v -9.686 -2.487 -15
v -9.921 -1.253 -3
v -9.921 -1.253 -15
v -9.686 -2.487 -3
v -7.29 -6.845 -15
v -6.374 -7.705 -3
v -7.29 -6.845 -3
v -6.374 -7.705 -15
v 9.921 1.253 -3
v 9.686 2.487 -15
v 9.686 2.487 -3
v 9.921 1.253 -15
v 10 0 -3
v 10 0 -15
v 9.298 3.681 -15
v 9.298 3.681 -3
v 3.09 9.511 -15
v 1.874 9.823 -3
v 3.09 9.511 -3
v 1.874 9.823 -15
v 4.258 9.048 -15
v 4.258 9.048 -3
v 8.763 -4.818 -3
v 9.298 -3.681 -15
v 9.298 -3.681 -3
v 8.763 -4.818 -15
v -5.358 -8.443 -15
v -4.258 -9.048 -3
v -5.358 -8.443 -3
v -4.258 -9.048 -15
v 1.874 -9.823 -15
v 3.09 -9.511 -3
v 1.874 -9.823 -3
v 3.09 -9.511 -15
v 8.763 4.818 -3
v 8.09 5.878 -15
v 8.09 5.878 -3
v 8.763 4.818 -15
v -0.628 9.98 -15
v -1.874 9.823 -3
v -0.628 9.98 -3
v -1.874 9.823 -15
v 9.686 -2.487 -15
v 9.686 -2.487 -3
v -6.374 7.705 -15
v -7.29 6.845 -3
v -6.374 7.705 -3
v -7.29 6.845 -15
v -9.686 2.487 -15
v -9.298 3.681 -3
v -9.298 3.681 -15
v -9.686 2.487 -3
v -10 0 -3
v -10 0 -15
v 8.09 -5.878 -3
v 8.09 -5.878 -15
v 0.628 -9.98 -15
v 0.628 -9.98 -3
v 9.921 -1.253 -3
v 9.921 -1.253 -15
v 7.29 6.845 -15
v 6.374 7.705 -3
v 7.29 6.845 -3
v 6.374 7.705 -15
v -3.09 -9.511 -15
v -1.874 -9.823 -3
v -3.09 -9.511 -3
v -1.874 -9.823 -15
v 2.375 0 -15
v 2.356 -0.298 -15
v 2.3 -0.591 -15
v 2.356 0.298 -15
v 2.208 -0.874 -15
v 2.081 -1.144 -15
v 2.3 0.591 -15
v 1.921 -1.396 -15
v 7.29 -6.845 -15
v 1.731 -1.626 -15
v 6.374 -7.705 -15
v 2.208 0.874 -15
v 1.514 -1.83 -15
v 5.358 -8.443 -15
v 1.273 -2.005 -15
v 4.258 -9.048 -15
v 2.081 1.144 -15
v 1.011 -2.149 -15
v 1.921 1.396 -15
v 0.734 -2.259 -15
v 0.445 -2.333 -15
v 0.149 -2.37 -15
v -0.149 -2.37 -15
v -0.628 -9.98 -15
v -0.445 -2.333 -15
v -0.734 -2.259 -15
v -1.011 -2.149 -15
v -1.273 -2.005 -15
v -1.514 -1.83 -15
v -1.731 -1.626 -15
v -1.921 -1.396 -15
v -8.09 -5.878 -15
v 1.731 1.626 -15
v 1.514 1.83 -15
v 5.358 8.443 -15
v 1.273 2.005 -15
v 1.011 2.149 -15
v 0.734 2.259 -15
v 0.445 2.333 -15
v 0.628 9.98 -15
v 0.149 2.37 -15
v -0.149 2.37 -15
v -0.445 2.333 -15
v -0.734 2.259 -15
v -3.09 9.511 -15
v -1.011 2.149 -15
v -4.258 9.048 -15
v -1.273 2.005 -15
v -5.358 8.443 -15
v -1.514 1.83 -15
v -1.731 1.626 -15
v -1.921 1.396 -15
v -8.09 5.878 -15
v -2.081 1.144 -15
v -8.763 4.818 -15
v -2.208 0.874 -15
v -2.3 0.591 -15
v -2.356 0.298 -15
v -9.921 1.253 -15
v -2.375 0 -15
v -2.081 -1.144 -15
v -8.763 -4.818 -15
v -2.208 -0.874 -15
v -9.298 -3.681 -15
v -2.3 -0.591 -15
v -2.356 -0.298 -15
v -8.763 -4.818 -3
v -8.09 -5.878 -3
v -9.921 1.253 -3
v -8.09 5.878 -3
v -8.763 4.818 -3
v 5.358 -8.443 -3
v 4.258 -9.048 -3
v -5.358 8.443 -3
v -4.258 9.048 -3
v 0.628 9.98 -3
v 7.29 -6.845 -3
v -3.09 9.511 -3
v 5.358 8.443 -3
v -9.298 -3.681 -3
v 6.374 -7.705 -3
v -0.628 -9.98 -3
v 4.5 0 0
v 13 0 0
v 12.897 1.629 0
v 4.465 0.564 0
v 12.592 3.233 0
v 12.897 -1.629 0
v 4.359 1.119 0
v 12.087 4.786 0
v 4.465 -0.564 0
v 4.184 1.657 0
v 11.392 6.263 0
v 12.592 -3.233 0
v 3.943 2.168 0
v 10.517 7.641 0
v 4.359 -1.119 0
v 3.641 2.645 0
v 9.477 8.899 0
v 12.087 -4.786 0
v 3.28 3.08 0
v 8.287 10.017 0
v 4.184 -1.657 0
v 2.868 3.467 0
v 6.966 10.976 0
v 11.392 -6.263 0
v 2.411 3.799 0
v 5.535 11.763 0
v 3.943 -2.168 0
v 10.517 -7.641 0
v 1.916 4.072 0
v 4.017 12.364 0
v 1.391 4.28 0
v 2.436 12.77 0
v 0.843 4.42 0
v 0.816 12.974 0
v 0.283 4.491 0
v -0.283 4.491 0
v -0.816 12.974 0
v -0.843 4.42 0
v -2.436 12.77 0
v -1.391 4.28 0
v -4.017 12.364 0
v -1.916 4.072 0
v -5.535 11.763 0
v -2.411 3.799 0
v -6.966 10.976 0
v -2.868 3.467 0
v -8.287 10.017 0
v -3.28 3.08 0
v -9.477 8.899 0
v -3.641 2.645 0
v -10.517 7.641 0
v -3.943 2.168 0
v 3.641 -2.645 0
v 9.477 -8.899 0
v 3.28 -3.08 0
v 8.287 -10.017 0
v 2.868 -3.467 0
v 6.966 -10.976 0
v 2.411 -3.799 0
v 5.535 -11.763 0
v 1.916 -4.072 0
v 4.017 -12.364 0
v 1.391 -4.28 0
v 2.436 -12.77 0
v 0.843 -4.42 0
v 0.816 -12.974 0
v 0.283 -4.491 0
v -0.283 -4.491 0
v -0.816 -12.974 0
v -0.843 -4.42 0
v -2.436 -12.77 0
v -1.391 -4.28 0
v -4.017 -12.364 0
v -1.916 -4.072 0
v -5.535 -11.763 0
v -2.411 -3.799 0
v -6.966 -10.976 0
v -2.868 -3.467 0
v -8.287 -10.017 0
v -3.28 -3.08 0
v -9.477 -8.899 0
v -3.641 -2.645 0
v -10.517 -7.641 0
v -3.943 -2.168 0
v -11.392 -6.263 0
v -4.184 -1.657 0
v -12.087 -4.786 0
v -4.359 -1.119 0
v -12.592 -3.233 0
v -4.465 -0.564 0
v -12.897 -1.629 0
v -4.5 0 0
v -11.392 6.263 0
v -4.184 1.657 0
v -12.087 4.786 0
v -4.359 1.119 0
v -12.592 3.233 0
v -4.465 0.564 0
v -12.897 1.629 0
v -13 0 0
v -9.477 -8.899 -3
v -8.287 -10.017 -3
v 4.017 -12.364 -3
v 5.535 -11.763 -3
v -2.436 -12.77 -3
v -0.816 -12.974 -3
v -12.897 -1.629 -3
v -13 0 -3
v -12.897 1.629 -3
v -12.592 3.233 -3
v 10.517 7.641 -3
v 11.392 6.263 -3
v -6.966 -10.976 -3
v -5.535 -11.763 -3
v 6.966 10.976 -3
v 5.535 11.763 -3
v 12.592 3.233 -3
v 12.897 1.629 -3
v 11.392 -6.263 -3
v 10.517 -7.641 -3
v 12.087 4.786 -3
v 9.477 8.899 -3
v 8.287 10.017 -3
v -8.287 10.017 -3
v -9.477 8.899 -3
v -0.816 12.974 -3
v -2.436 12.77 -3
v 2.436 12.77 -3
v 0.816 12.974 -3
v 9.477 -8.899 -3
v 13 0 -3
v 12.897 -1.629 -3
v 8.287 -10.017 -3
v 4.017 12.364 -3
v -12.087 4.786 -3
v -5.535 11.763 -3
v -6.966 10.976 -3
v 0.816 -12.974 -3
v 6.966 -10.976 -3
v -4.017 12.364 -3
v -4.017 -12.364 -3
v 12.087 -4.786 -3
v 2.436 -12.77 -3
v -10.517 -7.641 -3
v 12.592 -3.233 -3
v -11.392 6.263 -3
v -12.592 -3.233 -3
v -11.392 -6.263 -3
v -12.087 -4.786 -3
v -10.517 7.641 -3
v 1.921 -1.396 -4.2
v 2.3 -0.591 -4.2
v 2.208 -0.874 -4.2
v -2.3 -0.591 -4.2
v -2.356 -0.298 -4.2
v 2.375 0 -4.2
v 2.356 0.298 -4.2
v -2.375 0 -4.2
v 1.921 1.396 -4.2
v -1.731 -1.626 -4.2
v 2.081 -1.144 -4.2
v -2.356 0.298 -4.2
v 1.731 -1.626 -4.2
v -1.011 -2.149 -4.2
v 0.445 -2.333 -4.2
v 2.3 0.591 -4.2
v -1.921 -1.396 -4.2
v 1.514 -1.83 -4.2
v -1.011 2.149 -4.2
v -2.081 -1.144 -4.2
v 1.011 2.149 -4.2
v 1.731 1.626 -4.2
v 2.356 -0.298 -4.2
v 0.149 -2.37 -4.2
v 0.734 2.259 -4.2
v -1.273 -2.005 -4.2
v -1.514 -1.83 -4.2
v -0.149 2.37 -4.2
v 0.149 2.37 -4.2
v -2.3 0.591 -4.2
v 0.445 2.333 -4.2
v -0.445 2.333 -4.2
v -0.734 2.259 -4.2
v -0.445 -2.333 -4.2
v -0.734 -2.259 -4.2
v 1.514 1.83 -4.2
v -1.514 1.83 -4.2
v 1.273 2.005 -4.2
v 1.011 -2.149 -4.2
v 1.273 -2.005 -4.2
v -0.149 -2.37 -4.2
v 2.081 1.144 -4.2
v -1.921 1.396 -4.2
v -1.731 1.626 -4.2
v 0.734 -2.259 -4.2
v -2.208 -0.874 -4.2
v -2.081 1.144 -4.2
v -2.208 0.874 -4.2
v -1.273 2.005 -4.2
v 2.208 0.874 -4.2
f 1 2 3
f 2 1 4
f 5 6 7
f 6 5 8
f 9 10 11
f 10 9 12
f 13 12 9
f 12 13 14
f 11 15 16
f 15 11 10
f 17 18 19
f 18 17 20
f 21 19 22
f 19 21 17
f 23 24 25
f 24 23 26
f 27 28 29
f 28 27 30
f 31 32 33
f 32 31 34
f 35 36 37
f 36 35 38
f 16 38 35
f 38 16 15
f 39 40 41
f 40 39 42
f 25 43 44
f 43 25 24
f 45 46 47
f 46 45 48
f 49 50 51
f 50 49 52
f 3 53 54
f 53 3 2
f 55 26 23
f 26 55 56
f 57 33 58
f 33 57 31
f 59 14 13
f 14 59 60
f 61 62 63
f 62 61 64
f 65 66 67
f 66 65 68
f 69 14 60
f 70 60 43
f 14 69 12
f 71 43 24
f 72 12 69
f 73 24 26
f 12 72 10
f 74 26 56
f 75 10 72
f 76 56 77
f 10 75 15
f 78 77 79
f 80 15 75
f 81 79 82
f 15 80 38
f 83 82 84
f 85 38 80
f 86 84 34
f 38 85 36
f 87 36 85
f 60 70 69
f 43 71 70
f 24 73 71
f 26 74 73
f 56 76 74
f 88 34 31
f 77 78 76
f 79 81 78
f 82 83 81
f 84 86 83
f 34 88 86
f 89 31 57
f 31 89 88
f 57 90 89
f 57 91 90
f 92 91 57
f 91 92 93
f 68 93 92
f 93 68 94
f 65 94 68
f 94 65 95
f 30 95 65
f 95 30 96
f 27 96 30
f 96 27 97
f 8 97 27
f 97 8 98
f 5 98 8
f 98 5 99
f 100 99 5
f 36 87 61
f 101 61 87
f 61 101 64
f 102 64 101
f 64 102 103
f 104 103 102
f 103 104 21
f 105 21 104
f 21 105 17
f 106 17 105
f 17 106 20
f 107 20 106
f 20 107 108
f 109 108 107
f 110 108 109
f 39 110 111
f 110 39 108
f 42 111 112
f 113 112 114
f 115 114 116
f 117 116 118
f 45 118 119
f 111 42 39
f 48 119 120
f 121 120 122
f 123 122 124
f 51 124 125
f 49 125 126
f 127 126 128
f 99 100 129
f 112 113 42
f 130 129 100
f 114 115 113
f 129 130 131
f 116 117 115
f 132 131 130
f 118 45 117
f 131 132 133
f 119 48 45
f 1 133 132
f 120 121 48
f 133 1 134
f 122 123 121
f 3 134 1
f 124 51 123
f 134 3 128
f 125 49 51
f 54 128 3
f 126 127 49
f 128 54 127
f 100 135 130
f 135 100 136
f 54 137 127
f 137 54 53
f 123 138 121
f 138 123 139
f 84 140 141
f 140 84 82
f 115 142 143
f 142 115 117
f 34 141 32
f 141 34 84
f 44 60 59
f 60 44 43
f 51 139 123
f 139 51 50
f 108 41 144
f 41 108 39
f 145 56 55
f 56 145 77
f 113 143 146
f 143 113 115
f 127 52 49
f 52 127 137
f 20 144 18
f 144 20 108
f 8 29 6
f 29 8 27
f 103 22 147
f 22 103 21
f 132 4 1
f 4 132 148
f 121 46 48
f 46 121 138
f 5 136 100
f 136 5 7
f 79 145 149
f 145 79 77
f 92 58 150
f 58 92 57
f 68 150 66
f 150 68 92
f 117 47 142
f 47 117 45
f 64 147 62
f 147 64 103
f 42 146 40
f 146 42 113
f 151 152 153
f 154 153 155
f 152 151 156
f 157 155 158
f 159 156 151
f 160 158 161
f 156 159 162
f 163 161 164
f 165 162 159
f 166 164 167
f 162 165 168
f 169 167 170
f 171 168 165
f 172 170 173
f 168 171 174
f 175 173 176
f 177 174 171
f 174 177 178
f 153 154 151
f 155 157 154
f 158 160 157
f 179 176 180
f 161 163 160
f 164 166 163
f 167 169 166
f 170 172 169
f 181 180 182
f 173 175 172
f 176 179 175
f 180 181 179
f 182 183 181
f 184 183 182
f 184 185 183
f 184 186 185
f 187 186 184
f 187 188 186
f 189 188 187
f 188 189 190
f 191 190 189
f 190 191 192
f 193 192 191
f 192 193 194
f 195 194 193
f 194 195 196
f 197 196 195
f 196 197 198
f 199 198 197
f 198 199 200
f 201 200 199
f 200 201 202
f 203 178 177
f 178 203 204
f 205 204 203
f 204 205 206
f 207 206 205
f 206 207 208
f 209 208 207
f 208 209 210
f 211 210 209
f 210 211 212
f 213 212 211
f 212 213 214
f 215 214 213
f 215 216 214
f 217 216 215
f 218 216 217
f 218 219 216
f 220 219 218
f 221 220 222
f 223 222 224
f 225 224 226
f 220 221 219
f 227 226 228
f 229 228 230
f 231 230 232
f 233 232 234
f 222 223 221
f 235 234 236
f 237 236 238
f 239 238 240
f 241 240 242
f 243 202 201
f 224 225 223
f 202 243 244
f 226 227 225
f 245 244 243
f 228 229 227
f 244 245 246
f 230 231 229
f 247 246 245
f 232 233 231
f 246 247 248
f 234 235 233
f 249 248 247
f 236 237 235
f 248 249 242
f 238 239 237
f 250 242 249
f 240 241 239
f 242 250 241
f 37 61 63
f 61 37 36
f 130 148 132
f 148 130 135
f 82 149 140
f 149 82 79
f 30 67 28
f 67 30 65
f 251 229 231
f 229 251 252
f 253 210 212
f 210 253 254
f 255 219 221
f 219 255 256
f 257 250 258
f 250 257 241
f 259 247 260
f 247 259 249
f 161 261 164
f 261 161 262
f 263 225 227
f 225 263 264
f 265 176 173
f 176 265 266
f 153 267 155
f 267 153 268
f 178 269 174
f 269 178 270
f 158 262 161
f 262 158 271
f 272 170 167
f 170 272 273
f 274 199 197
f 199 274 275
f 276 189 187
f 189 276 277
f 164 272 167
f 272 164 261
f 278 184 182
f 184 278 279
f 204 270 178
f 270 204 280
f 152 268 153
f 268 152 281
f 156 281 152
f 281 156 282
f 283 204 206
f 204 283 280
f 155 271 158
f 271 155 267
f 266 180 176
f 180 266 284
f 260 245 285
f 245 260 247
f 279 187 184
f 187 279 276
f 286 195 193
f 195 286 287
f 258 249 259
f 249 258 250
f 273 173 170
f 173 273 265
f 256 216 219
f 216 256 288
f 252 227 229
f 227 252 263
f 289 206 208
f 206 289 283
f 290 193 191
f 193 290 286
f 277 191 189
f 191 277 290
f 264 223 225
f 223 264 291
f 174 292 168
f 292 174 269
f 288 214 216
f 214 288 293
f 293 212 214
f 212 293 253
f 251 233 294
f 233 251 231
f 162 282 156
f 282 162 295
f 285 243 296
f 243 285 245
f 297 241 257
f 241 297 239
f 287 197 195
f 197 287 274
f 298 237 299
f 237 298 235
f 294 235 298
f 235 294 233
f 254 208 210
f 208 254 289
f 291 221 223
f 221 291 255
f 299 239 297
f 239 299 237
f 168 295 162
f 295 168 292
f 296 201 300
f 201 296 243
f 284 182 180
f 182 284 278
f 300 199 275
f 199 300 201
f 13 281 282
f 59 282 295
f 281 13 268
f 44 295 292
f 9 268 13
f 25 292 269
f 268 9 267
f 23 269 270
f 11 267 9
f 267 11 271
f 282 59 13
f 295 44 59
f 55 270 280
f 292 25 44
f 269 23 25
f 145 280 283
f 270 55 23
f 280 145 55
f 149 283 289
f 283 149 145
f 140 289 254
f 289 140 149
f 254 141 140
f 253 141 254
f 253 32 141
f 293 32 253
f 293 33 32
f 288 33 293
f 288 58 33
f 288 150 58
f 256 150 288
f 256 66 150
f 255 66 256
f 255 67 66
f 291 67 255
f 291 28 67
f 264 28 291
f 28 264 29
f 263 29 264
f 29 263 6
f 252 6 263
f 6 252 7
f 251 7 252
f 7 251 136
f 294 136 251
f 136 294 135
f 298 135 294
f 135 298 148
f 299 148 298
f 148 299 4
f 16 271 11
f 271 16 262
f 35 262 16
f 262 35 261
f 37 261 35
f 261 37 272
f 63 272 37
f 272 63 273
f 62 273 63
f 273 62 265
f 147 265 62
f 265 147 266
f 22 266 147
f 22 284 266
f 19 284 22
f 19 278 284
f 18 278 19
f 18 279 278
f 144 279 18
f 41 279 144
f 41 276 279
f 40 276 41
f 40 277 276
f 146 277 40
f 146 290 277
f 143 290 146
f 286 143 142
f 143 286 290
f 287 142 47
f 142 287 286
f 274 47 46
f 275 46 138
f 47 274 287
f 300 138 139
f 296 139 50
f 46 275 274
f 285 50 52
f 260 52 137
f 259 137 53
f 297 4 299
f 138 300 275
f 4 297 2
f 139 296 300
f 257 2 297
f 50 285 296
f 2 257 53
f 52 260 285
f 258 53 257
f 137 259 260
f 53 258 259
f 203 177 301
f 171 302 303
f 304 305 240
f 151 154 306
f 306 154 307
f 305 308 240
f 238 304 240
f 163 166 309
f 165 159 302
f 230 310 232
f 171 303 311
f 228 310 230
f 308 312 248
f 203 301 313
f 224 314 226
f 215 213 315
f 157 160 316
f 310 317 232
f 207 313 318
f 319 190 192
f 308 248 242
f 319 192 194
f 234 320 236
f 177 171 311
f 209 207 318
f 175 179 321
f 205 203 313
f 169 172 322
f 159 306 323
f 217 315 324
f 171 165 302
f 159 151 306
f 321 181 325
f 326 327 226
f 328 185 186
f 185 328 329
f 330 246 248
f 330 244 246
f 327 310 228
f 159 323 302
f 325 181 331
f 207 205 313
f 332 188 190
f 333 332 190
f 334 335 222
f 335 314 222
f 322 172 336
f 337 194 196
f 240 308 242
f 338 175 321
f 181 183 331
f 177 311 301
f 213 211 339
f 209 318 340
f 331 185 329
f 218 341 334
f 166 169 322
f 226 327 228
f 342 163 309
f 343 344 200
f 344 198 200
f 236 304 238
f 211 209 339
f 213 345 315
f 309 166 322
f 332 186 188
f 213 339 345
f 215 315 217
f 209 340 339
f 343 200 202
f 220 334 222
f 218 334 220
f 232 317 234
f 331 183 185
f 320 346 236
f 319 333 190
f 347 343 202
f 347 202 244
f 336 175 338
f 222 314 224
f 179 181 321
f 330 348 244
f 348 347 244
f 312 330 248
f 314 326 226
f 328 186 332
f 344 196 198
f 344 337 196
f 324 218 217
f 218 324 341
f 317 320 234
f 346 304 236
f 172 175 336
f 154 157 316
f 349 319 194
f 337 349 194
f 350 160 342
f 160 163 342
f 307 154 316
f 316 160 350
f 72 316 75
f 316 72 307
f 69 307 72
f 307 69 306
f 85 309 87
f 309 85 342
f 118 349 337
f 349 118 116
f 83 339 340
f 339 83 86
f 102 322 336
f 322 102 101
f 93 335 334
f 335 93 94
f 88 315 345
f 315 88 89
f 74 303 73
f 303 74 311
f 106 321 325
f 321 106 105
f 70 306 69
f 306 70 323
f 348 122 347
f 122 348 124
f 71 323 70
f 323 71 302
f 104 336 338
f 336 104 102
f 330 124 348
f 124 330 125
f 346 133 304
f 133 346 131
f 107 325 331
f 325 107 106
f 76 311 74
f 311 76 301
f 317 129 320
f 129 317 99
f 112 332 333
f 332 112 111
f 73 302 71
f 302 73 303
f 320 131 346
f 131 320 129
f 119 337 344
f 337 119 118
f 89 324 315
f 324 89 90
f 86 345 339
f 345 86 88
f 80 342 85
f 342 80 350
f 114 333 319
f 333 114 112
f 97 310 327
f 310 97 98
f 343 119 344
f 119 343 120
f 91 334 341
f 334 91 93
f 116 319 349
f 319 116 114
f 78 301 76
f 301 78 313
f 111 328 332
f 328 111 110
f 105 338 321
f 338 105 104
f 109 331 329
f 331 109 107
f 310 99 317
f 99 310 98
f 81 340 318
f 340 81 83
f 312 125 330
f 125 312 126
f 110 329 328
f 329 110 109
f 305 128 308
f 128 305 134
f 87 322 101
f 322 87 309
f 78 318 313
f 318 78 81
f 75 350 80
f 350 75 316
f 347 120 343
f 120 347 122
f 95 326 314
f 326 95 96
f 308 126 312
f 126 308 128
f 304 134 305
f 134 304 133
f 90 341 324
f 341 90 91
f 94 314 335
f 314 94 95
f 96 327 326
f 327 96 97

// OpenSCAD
$fn = 50;


difference() {
	union() {
		translate(v = [0, 0, -15.0000000000]) {
			cylinder(h = 15, r = 10.0000000000);
		}
		translate(v = [0, 0, -3.0000000000]) {
			cylinder(h = 3, r = 13.0000000000);
		}
	}
	union() {
		translate(v = [0, 0, 0]) {
			rotate(a = [0, 0, 0]) {
				difference() {
					union() {
						#translate(v = [0, 0, -15.0000000000]) {
							cylinder(h = 15, r = 2.2500000000);
						}
						#translate(v = [0, 0, -4.2000000000]) {
							cylinder(h = 4.2000000000, r = 10.0000000000, r1 = 2.3750000000, r2 = 4.5000000000);
						}
						#translate(v = [0, 0, -15.0000000000]) {
							cylinder(h = 15, r = 2.3750000000);
						}
						#translate(v = [0, 0, -15.0000000000]) {
							cylinder(h = 15, r = 2.2500000000);
						}
					}
					union();
				}
			}
		}
	}
}
